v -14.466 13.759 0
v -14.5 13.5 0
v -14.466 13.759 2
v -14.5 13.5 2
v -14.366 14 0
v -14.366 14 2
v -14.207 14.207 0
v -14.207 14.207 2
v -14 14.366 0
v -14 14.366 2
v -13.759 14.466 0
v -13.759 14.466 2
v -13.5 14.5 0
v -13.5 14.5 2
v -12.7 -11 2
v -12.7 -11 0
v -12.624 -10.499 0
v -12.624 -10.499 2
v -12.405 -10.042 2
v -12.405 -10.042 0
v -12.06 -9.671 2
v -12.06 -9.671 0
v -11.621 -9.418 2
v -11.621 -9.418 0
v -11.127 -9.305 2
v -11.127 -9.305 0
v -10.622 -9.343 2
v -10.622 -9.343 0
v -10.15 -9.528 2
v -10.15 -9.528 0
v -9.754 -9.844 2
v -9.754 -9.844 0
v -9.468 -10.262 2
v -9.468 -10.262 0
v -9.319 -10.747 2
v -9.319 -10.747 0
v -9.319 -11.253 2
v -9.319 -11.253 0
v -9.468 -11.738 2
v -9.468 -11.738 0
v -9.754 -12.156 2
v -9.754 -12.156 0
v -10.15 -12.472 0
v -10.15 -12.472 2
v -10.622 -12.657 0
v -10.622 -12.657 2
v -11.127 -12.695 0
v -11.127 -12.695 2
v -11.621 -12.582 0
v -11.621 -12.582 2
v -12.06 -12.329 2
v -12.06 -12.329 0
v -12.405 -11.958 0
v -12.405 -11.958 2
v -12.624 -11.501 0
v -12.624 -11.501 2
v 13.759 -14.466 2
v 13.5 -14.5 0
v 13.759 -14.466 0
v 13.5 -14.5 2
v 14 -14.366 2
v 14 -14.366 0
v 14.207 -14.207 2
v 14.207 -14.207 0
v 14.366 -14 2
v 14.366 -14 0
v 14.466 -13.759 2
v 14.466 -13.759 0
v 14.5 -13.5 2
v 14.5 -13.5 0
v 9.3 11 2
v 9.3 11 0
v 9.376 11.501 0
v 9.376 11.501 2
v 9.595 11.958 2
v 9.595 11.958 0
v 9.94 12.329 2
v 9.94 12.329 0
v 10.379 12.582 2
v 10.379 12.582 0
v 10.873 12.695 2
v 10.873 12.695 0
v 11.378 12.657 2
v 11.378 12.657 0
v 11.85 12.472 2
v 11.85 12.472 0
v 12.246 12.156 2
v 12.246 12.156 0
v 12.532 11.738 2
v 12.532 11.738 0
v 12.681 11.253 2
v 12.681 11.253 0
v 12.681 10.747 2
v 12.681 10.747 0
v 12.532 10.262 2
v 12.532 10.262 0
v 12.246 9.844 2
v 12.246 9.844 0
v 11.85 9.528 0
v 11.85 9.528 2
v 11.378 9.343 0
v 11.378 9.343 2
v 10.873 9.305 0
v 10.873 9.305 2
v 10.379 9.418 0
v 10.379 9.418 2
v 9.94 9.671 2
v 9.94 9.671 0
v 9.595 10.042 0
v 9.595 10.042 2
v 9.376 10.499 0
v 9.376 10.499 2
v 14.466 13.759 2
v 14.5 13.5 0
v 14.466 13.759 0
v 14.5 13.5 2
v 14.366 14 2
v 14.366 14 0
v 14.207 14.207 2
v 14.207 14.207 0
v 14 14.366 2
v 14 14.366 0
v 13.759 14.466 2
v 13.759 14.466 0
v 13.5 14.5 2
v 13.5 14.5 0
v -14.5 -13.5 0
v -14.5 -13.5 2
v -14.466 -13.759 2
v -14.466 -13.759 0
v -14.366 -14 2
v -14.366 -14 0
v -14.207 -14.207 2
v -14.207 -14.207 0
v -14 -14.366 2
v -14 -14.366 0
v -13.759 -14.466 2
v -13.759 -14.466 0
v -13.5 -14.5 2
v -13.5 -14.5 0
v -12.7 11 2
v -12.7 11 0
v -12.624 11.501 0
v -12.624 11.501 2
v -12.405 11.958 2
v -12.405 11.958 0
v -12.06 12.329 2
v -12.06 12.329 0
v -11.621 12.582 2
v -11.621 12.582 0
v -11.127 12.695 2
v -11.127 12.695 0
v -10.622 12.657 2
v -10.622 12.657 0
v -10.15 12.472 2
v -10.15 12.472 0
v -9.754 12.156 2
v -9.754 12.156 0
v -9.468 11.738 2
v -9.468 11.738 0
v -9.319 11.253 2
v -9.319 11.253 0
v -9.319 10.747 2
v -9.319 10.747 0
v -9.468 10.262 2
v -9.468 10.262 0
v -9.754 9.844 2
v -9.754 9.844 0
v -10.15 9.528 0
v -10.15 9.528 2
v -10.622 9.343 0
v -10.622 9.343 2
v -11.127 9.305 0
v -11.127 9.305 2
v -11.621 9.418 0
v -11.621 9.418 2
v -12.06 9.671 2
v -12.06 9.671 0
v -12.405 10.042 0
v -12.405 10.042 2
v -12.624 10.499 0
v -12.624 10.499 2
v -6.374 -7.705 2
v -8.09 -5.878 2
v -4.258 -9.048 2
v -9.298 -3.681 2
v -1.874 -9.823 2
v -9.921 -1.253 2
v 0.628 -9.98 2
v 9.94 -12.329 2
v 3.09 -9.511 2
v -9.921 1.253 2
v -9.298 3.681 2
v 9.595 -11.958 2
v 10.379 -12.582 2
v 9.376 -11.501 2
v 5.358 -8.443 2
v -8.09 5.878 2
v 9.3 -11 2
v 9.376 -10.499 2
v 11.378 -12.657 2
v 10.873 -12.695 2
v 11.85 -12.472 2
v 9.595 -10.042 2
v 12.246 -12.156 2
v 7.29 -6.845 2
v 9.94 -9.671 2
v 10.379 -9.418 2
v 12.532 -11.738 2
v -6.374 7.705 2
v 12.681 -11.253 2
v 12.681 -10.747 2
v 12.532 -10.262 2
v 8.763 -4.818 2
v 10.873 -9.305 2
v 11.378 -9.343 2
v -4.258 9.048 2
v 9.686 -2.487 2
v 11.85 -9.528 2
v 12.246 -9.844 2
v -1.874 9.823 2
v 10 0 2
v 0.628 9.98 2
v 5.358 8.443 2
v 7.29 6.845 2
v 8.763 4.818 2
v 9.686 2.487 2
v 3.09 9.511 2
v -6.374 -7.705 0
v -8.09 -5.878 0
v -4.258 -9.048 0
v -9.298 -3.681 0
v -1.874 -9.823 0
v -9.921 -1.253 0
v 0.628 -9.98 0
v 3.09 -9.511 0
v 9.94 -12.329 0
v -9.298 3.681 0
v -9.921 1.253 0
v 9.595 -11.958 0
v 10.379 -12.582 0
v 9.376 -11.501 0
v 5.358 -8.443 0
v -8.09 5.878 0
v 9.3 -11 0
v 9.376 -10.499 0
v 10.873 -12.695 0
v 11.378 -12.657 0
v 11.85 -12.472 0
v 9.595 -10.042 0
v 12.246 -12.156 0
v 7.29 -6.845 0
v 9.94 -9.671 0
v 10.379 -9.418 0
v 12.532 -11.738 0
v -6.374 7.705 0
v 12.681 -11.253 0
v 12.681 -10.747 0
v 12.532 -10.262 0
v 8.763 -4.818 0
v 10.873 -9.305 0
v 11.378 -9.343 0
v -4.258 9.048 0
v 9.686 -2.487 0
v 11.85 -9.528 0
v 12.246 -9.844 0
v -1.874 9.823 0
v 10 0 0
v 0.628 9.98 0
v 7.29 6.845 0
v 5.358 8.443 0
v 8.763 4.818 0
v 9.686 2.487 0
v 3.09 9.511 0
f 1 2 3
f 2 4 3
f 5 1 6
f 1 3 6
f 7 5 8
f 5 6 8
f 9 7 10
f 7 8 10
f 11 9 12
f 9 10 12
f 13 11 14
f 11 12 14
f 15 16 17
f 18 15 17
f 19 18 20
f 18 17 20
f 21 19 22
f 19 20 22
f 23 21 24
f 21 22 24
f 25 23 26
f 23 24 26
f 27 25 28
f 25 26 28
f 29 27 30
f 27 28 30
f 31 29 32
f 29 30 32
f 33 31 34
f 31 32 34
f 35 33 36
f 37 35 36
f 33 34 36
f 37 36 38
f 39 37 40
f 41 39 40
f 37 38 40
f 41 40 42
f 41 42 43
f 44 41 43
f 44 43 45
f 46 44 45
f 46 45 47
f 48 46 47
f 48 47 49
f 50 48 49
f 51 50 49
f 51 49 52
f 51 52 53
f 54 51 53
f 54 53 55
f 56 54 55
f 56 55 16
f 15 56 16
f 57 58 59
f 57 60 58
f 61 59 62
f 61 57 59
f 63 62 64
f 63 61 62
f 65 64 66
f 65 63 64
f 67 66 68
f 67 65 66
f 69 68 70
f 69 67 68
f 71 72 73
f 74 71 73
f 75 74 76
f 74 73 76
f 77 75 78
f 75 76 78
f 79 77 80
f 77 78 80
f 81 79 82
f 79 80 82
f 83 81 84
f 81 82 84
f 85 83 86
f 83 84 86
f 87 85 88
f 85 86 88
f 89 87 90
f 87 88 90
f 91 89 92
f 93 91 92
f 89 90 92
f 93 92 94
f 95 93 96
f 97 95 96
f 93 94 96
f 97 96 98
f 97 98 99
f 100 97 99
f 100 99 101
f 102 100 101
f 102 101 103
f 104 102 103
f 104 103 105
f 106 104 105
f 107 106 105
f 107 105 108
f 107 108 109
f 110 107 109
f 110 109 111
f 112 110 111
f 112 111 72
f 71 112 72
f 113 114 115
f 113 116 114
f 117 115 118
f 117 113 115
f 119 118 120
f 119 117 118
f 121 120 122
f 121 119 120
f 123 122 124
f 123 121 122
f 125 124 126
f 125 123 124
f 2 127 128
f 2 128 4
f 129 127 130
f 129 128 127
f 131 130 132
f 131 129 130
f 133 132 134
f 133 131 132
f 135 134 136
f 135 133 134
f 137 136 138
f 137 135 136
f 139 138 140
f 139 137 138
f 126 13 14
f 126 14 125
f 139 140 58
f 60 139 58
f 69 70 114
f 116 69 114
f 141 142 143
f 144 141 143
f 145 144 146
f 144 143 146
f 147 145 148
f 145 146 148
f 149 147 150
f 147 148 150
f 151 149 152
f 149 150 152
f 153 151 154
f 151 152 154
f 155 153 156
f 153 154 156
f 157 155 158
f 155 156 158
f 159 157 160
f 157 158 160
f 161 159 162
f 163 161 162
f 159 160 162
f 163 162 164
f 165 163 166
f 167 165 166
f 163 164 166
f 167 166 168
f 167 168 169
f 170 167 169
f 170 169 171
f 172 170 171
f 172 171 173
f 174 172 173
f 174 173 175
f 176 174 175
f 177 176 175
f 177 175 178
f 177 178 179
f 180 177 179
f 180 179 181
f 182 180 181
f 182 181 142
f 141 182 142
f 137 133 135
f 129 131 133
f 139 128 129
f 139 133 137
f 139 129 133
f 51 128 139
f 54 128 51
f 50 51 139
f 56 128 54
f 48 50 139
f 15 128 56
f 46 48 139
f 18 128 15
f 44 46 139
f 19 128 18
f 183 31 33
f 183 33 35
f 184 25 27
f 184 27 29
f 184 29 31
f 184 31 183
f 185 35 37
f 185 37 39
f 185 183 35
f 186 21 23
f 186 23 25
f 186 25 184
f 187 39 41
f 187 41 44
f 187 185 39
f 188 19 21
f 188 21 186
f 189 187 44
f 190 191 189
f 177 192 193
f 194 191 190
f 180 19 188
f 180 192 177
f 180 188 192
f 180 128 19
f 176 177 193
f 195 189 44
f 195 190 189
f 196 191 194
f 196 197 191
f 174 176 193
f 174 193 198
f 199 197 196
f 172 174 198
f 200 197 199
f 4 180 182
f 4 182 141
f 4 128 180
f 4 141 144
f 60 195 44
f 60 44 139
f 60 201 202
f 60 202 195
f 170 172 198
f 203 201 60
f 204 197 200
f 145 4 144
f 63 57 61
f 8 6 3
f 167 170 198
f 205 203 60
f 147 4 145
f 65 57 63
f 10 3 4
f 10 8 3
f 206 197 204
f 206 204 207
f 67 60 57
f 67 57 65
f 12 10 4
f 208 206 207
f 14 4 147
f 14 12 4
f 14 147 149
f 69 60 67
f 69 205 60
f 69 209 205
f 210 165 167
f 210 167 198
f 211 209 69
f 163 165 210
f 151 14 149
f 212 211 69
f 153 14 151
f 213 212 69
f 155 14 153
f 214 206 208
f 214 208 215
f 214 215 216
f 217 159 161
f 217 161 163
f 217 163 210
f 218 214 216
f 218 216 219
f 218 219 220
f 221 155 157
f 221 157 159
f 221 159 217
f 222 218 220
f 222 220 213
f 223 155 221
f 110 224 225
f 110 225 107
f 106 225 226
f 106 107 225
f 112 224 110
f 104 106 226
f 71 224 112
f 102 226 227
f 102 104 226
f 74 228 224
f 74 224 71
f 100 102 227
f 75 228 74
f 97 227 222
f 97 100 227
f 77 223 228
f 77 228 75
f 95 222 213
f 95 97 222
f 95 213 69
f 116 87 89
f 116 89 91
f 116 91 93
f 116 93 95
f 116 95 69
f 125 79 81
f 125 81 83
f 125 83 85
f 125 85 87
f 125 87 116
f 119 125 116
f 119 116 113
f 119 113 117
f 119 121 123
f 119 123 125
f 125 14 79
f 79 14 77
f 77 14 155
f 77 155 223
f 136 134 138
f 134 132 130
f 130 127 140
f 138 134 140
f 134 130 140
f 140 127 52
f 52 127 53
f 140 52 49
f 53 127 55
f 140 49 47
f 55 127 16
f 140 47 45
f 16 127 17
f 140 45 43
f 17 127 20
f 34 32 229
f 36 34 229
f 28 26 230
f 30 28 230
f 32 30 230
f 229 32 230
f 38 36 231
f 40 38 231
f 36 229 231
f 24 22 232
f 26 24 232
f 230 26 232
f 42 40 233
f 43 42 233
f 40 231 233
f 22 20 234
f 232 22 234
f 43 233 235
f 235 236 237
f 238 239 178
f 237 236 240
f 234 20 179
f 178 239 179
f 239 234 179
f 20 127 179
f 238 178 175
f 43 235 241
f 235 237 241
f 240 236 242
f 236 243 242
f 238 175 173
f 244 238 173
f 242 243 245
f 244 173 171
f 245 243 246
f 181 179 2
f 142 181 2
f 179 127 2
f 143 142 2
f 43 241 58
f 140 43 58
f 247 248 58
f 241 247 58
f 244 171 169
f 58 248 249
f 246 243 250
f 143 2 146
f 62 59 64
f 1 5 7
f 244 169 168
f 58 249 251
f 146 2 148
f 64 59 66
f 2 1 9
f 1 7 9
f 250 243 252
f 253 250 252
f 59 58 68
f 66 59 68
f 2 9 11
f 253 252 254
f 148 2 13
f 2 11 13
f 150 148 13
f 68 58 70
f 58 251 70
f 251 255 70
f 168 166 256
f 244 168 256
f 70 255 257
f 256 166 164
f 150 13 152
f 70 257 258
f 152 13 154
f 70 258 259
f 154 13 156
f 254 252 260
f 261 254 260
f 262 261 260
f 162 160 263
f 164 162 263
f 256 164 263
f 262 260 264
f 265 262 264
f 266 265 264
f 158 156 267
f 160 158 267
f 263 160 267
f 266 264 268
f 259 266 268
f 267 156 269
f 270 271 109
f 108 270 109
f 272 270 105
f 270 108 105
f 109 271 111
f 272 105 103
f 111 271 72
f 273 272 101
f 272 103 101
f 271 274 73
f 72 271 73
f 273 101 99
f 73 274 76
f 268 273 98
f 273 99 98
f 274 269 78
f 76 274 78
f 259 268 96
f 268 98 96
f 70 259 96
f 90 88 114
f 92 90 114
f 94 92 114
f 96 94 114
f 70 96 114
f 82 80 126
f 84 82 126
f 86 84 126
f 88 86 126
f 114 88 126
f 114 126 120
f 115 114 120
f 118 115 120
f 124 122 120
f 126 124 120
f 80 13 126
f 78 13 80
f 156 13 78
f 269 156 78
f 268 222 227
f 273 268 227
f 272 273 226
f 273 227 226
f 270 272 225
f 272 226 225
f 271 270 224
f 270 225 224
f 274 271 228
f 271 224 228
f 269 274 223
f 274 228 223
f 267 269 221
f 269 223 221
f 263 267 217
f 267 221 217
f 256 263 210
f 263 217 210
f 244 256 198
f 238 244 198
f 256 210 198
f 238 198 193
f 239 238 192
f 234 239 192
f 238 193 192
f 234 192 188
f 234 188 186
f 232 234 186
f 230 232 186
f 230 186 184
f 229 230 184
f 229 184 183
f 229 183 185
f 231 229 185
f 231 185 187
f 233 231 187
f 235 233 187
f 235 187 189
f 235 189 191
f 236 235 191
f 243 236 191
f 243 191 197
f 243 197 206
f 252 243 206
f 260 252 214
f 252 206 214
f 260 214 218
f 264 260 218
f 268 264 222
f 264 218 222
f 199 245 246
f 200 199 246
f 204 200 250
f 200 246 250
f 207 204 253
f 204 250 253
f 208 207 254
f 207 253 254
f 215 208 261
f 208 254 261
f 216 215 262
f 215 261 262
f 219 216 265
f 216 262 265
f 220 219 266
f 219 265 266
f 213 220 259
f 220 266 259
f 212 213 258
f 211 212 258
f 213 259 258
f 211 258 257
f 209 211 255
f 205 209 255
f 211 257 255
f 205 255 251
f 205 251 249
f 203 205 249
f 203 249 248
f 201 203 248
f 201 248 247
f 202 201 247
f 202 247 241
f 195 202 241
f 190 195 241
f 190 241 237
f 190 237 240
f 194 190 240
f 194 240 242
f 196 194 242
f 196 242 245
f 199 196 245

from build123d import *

# Parameters (mm, degrees)
SKETCH_1_W             = 29
SKETCH_1_H             = 29
EXTRUDE_1_DEPTH        = 2
FILLET_1_R             = 1
HOLE_WIZARD_M3_1_D     = 3.4
HOLE_WIZARD_M3_1_DEPTH = 7.5
HOLE_WIZARD_M3_1_TIP   = 1.021463052
SKETCH_4_R             = 10
CUT_EXTRUDE_1_DEPTH    = 21.603397778


with BuildPart() as part:
    # 草图1 → 凸台-拉伸1 (new body)
    with BuildSketch(Plane.XY):
        Rectangle(SKETCH_1_W, SKETCH_1_H)
    extrude(amount=EXTRUDE_1_DEPTH)

    # 圆角1
    fillet_1_edges = [part.edges().sort_by_distance(p)[0] for p in [
        (14.5, -14.5, 1),
        (-14.5, -14.5, 1),
        (-14.5, 14.5, 1),
        (14.5, 14.5, 1),
    ]]
    fillet(fillet_1_edges, radius=FILLET_1_R)

    # M3 间隙孔1
    with Locations(Plane.XY.offset(2)):
        with Locations((-11, 11), (11, 11), (-11, -11), (11, -11)):
            Hole(HOLE_WIZARD_M3_1_D / 2, depth=HOLE_WIZARD_M3_1_DEPTH)
            with Locations((0, 0, -(HOLE_WIZARD_M3_1_DEPTH + HOLE_WIZARD_M3_1_TIP / 2))):  # 118° drill point
                Cone(0, HOLE_WIZARD_M3_1_D / 2, HOLE_WIZARD_M3_1_TIP, mode=Mode.SUBTRACT)

    # 草图4 → 切除-拉伸1 (cut, through all)
    with BuildSketch(Plane.XY.offset(2)):
        Circle(SKETCH_4_R)
    extrude(amount=-CUT_EXTRUDE_1_DEPTH, mode=Mode.SUBTRACT)


solid = part.part
